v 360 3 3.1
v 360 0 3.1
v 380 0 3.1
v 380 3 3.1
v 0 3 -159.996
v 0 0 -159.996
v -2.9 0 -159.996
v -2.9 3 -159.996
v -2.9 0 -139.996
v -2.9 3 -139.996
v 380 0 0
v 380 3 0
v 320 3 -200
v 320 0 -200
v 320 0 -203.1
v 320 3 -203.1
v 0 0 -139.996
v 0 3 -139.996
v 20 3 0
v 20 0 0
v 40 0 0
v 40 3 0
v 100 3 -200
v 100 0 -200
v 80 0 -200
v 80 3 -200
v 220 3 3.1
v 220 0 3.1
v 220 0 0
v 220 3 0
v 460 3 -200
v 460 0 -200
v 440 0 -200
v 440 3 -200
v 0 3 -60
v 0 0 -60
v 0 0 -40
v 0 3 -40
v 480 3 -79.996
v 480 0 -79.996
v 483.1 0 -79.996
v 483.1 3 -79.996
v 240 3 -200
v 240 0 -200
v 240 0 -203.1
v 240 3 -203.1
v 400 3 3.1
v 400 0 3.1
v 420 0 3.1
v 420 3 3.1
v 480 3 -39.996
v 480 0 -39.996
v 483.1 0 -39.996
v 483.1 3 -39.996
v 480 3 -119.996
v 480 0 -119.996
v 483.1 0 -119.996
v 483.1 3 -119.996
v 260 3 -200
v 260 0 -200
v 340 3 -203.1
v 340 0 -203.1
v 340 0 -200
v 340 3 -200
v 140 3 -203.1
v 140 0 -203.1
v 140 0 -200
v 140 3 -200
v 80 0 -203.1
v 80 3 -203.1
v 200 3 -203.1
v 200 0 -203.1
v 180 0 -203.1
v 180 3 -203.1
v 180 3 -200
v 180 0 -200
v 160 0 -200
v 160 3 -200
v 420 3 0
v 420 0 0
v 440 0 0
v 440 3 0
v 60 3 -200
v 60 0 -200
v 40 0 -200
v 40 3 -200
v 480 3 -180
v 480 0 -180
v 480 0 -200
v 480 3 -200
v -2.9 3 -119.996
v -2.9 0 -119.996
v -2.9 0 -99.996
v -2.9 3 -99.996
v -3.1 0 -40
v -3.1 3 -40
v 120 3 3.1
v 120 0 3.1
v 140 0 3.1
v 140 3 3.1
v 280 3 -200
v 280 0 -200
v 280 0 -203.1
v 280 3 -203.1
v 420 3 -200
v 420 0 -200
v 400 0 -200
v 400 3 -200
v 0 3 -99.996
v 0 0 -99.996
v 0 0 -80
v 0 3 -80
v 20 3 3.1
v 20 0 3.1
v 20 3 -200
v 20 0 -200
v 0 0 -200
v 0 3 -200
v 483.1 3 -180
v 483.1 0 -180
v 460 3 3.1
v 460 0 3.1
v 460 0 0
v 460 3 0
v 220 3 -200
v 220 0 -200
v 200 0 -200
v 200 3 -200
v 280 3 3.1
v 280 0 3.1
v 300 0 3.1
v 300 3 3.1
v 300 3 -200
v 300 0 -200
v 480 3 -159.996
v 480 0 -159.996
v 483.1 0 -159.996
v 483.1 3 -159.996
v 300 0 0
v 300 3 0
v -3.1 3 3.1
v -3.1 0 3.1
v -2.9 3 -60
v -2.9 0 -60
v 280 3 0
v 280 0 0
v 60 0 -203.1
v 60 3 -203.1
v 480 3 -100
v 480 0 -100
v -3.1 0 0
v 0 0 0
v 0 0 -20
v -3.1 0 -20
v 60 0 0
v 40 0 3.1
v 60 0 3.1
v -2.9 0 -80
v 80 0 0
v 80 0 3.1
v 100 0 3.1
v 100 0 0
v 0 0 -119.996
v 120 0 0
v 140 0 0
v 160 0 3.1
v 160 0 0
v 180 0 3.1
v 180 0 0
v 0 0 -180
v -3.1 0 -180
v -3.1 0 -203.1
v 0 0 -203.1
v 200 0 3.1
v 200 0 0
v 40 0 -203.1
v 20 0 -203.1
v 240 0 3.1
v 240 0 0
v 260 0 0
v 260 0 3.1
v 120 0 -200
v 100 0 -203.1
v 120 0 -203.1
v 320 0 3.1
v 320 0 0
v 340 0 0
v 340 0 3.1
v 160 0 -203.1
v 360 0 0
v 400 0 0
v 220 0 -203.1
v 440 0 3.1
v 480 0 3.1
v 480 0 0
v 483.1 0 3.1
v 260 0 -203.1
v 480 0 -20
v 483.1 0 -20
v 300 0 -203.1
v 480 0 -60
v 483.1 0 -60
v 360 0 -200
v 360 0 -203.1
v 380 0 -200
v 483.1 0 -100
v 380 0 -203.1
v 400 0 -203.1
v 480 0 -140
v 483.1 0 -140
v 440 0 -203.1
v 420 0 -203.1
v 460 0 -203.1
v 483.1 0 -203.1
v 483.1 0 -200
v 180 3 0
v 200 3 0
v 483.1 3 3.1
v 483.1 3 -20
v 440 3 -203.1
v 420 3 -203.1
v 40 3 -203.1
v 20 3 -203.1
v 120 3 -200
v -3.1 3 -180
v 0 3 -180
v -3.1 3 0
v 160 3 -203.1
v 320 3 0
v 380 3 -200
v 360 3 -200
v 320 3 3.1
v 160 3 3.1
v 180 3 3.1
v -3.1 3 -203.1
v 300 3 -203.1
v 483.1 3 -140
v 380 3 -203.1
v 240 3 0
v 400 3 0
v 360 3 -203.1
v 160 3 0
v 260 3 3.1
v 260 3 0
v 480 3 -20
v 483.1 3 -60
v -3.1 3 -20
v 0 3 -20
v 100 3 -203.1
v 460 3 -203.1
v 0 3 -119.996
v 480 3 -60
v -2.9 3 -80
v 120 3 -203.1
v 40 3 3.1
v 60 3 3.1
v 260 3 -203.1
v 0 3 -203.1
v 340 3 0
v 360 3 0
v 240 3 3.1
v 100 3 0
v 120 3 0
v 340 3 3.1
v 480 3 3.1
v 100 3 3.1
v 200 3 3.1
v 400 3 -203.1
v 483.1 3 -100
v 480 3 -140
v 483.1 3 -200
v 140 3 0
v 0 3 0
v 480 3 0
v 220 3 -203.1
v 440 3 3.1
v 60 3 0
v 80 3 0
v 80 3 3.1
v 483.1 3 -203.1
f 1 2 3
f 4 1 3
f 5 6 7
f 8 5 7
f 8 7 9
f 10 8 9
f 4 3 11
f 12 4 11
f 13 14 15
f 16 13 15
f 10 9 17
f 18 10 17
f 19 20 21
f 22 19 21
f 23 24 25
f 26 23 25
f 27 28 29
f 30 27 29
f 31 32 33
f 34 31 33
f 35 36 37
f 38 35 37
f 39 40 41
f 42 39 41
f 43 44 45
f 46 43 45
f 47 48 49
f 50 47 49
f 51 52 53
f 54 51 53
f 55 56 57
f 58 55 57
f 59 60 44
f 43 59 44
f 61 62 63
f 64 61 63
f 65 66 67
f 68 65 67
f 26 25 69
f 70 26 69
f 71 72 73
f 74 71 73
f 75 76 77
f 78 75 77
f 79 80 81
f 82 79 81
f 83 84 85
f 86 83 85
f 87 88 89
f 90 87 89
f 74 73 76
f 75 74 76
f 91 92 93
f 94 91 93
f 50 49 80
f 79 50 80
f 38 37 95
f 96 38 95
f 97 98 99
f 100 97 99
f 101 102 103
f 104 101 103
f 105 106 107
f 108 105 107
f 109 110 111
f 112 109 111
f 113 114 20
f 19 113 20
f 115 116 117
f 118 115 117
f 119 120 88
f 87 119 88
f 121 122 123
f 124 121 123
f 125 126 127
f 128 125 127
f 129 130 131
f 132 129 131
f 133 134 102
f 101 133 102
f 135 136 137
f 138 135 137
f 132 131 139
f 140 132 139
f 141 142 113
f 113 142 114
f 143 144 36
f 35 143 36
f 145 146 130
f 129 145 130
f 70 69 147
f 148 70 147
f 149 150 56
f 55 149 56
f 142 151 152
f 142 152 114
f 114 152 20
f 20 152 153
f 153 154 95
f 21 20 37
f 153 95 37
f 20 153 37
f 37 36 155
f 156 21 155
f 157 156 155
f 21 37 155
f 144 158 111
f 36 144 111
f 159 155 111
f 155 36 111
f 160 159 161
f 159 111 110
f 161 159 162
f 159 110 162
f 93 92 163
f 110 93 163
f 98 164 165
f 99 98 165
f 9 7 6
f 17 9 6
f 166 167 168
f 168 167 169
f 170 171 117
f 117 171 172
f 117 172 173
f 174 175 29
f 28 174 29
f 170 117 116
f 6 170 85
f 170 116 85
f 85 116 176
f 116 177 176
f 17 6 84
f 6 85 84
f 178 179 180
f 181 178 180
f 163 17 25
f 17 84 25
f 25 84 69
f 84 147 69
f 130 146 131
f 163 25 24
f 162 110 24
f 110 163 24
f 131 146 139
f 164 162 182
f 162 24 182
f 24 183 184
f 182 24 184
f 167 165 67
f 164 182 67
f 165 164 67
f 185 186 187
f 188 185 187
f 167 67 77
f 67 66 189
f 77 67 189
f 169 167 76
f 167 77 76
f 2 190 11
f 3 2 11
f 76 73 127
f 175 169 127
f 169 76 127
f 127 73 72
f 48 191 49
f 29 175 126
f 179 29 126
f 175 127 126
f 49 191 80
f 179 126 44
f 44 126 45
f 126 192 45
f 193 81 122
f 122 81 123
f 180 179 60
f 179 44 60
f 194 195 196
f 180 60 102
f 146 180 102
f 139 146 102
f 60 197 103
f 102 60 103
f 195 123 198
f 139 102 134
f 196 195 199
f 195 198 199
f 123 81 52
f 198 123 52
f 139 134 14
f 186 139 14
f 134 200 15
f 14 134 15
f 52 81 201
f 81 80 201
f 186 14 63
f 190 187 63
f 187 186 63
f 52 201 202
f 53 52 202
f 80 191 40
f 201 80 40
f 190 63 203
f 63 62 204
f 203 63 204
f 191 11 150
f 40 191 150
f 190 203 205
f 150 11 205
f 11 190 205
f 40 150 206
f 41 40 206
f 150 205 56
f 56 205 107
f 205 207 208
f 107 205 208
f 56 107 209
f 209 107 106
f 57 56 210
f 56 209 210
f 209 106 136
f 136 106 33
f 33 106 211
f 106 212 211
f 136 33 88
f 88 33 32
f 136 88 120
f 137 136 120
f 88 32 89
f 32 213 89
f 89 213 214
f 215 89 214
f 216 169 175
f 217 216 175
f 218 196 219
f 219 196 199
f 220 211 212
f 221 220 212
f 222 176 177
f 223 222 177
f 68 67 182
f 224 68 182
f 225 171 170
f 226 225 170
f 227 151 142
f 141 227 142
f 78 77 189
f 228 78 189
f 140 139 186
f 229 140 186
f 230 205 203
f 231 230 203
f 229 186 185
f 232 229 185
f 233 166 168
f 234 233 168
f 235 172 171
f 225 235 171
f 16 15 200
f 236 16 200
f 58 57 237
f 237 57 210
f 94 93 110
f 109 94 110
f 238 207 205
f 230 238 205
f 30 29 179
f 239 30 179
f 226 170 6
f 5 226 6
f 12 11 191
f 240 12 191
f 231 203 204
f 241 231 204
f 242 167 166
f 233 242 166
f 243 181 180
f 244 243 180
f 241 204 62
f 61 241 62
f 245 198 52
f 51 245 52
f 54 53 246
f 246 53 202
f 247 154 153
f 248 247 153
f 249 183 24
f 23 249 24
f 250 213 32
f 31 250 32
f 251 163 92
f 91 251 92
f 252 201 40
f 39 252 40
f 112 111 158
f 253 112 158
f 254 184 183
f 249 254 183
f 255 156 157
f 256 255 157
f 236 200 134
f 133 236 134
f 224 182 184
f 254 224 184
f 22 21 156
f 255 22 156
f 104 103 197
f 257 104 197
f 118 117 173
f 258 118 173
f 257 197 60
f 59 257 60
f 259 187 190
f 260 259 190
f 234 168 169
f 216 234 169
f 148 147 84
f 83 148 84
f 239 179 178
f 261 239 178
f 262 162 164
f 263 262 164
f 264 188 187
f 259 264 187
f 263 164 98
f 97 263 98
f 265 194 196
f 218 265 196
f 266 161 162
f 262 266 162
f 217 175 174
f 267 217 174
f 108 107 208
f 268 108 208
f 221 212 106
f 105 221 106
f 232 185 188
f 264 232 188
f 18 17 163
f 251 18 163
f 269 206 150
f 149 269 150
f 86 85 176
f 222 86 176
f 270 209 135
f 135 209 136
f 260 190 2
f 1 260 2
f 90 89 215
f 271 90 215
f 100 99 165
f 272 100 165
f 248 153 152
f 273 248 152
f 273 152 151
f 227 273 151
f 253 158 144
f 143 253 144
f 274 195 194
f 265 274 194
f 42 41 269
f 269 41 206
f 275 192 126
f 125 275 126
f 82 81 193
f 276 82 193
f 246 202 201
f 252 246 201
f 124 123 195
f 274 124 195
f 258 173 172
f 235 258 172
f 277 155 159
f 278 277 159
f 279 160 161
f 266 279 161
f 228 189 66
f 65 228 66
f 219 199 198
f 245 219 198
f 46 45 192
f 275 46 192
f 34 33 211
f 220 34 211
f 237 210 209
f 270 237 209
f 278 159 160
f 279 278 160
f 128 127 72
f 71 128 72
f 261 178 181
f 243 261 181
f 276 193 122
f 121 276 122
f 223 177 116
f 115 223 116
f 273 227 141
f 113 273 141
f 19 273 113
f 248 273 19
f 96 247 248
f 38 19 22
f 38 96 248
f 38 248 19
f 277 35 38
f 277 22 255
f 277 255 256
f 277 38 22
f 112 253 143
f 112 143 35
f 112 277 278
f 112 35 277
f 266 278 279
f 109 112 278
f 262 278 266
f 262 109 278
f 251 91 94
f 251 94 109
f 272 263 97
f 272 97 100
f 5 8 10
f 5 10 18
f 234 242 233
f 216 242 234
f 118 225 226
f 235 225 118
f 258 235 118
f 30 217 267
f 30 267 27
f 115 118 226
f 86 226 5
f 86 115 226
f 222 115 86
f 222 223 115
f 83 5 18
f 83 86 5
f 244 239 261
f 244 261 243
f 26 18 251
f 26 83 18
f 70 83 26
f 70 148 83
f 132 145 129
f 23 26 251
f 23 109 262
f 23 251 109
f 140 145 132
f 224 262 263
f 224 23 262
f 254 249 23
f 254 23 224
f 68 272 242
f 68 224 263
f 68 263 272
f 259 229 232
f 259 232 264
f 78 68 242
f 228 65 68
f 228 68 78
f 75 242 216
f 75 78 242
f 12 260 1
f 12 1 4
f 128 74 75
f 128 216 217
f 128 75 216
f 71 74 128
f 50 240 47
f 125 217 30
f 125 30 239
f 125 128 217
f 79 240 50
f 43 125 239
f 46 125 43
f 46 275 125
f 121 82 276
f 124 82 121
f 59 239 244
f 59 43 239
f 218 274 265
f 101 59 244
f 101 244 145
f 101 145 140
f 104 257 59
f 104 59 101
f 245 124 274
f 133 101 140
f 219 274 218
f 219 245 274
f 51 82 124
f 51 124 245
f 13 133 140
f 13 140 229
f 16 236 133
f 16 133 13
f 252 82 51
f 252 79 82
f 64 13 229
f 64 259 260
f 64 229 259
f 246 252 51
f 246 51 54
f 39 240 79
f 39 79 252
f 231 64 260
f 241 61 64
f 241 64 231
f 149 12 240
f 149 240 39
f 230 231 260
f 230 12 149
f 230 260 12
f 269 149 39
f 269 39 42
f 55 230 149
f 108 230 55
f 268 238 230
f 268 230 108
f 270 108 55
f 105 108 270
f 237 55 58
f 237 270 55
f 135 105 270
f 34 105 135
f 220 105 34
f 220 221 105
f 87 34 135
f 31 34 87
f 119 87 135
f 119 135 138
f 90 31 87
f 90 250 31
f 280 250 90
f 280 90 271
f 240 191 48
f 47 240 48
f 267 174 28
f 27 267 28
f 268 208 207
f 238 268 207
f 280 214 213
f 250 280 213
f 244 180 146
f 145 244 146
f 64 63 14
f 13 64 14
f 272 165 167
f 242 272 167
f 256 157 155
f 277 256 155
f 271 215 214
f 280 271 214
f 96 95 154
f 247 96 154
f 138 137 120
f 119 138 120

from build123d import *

# Parameters (mm, degrees)
SALIENTE_EXTRUIR1_DEPTH = 3


with BuildPart() as part:
    # Croquis1 → Saliente-Extruir1 (new body)
    with BuildSketch(Plane(origin=(0, 0, 0), x_dir=(1, 0, 0), z_dir=(0, 1, 0))):
        Polygon((0, 200), (0, 203.1), (-3.1, 203.1), (-3.1, 180), (0, 180), (0, 159.996339437), (-2.9, 159.996339437), (-2.9, 139.996339437), (0, 139.996339437), (0, 119.996339437), (-2.9, 119.996339437), (-2.9, 99.996339437), (0, 99.996339437), (0, 80), (-2.9, 80), (-2.9, 60), (0, 60), (0, 40), (-3.1, 40), (-3.1, 20), (0, 20), (0, 0), (-3.1, 0), (-3.1, -3.1), (20, -3.1), (20, 0), (40, 0), (40, -3.1), (60, -3.1), (60, 0), (80, 0), (80, -3.1), (100, -3.1), (100, 0), (120, 0), (120, -3.1), (140, -3.1), (140, 0), (160, 0), (160, -3.1), (180, -3.1), (180, 0), (200, 0), (200, -3.1), (220, -3.1), (220, 0), (240, 0), (240, -3.1), (260, -3.1), (260, 0), (280, 0), (280, -3.1), (300, -3.1), (300, 0), (320, 0), (320, -3.1), (340, -3.1), (340, 0), (360, 0), (360, -3.1), (380, -3.1), (380, 0), (400, 0), (400, -3.1), (420, -3.1), (420, 0), (440, 0), (440, -3.1), (460, -3.1), (460, 0), (480, 0), (480, -3.1), (483.1, -3.1), (483.1, 20), (480, 20), (480, 39.996339437), (483.1, 39.996339437), (483.1, 60), (480, 60), (480, 79.996339437), (483.1, 79.996339437), (483.1, 100), (480, 100), (480, 119.996339437), (483.1, 119.996339437), (483.1, 140), (480, 140), (480, 159.996339437), (483.1, 159.996339437), (483.1, 180), (480, 180), (480, 200), (483.1, 200), (483.1, 203.1), (460, 203.1), (460, 200), (440, 200), (440, 203.1), (420, 203.1), (420, 200), (400, 200), (400, 203.1), (380, 203.1), (380, 200), (360, 200), (360, 203.1), (340, 203.1), (340, 200), (320, 200), (320, 203.1), (300, 203.1), (300, 200), (280, 200), (280, 203.1), (260, 203.1), (260, 200), (240, 200), (240, 203.1), (220, 203.1), (220, 200), (200, 200), (200, 203.1), (180, 203.1), (180, 200), (160, 200), (160, 203.1), (140, 203.1), (140, 200), (120, 200), (120, 203.1), (100, 203.1), (100, 200), (80, 200), (80, 203.1), (60, 203.1), (60, 200), (40, 200), (40, 203.1), (20, 203.1), (20, 200), align=None)
    extrude(amount=SALIENTE_EXTRUIR1_DEPTH)


solid = part.part
